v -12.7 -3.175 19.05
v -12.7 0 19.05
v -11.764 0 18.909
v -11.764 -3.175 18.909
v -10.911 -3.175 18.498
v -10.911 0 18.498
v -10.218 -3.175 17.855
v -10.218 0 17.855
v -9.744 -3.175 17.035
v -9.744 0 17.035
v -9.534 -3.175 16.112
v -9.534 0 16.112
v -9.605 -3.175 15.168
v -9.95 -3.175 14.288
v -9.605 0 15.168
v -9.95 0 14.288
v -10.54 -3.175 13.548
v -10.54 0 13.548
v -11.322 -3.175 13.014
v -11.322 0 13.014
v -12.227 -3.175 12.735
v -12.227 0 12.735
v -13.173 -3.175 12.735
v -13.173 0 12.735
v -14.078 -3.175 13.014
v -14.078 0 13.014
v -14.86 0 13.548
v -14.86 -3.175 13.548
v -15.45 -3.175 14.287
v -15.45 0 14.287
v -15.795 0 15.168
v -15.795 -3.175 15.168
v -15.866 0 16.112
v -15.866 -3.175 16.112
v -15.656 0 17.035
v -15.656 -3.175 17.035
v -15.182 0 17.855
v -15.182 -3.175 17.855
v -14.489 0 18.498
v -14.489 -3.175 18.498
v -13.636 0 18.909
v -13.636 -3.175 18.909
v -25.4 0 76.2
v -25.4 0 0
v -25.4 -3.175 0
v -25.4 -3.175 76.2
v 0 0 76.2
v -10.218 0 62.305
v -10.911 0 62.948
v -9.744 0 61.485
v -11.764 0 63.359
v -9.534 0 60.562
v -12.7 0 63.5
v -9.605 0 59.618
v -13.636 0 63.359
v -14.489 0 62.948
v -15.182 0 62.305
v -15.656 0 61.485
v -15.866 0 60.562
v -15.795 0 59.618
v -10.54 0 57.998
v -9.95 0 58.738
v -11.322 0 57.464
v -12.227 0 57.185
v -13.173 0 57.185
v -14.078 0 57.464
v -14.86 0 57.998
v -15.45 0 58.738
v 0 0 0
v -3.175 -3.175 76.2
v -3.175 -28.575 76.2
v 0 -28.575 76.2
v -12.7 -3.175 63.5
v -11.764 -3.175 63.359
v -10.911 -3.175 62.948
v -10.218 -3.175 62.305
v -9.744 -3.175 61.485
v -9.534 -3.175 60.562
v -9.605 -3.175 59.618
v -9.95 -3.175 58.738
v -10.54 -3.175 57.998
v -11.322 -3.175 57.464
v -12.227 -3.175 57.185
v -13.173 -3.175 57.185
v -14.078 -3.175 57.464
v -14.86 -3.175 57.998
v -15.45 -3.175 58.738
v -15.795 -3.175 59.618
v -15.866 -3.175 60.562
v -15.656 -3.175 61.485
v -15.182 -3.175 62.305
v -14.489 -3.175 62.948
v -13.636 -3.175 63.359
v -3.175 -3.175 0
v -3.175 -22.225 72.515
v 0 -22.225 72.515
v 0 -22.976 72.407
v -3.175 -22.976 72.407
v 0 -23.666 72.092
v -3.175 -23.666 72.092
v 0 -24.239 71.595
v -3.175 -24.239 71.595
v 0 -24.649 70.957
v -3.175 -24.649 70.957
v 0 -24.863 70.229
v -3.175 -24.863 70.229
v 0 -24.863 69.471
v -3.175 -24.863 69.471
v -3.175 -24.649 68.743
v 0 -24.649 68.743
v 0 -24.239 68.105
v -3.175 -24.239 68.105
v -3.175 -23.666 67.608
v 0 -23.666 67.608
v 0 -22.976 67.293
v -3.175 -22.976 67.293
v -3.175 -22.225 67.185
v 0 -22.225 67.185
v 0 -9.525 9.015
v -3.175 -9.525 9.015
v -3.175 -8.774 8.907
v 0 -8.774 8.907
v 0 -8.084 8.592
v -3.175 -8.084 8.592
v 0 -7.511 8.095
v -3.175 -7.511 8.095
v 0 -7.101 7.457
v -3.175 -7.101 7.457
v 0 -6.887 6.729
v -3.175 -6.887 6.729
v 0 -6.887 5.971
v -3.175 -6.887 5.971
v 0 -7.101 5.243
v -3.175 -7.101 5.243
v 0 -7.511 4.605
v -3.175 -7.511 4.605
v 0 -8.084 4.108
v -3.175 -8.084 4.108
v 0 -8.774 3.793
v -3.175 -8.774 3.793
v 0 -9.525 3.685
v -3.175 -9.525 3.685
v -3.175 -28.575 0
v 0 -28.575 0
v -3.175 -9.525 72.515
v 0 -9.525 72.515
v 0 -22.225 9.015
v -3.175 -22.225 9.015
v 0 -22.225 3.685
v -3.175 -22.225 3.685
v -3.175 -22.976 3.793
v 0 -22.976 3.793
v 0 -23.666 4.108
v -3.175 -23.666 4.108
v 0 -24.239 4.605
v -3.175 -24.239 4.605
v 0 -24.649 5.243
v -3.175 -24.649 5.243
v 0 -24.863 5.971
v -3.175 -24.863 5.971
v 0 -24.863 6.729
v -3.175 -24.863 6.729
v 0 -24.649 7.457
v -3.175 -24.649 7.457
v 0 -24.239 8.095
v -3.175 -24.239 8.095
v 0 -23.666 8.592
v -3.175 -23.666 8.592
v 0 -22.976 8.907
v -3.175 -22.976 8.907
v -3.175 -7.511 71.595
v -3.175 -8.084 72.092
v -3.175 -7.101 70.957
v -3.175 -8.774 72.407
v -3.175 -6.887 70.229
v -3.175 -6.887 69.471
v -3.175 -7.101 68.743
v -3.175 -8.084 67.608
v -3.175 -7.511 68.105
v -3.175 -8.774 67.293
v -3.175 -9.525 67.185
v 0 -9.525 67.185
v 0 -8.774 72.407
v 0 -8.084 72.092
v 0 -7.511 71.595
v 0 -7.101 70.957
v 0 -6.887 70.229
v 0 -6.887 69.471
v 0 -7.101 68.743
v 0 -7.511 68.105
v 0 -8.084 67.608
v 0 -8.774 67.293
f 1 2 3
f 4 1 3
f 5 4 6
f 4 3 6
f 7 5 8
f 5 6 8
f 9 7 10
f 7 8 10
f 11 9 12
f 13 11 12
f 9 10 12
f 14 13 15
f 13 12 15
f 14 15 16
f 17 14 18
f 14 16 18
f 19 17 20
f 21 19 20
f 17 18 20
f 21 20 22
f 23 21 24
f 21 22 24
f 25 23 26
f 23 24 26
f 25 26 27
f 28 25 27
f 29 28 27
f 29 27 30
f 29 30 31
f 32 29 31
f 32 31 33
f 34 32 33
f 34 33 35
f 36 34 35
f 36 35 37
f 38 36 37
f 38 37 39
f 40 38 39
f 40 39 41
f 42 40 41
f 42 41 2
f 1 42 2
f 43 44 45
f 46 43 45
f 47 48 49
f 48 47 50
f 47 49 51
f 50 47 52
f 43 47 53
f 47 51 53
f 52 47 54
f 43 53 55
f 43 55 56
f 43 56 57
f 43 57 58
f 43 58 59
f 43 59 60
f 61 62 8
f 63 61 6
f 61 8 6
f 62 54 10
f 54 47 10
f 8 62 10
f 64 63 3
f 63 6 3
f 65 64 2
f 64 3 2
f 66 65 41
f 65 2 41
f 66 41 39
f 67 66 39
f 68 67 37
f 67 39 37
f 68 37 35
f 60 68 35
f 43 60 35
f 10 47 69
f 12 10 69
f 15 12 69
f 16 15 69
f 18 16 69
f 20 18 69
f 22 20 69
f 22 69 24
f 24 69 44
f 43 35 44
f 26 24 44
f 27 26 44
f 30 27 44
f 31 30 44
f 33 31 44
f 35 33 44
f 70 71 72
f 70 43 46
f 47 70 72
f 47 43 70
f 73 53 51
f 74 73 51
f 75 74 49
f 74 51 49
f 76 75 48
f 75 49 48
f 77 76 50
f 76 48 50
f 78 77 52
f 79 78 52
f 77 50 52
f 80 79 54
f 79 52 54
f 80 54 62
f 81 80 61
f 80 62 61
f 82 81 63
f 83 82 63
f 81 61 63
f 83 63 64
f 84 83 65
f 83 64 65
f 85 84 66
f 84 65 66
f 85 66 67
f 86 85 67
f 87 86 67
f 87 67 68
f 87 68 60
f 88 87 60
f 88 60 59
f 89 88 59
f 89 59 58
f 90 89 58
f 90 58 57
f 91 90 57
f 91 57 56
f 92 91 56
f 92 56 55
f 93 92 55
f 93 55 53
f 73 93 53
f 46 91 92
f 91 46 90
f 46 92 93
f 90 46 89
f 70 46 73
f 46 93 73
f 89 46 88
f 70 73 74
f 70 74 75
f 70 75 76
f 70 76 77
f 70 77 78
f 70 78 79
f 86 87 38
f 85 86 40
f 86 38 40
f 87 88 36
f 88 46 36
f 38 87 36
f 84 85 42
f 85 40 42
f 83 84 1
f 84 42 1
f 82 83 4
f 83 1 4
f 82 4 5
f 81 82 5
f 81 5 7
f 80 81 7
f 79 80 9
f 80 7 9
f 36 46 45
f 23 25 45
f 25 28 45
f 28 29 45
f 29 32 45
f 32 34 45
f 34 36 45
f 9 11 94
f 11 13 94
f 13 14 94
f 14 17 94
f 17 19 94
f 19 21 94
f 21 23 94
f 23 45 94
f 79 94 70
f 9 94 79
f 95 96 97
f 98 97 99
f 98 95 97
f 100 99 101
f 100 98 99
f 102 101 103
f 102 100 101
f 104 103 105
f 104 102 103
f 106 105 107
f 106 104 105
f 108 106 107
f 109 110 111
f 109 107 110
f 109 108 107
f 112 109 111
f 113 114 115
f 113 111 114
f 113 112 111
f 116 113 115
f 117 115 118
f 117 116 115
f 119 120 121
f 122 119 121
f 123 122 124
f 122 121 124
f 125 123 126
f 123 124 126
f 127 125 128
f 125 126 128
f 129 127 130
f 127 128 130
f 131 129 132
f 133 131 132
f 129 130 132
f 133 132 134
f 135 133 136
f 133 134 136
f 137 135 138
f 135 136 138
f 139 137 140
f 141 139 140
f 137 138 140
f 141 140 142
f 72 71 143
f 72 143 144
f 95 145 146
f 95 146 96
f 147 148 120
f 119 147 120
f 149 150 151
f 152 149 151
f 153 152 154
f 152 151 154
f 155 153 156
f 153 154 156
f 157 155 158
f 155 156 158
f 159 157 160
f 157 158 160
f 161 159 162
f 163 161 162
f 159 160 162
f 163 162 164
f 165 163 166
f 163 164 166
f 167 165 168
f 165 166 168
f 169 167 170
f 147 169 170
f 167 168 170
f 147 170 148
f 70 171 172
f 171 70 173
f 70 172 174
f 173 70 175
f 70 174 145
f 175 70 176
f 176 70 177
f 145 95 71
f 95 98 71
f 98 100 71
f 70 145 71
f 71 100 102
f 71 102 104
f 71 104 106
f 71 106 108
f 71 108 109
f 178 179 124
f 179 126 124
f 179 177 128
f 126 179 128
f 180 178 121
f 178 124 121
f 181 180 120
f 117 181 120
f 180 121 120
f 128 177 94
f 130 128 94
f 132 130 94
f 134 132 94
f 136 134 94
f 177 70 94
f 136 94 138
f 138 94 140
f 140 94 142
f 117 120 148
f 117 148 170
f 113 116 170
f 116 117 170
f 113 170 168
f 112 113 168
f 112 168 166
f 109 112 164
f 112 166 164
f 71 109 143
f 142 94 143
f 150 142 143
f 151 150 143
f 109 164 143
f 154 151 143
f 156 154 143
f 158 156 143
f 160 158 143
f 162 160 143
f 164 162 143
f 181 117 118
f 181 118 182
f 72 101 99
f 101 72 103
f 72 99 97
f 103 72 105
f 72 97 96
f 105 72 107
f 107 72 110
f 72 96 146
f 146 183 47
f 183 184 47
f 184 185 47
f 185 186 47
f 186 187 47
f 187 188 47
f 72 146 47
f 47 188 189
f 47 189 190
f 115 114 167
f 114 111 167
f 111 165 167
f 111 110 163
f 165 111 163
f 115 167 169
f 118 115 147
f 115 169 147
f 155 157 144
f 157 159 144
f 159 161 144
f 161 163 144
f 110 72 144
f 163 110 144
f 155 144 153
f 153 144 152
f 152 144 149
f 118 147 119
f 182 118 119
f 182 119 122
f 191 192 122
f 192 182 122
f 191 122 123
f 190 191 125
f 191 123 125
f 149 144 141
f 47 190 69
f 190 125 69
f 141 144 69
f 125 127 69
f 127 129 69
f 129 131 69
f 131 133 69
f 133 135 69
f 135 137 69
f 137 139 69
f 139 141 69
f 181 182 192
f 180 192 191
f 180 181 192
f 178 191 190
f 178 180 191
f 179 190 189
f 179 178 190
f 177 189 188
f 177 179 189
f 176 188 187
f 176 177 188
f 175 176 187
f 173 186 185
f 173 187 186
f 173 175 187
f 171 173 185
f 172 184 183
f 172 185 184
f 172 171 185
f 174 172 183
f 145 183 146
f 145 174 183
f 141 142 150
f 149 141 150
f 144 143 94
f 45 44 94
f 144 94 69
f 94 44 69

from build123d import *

# Parameters (mm, degrees)
BOSS_EXTRUDE1_DEPTH = 76.2
CUT_EXTRUDE1_REACH  = 97.038
SKETCH2_R           = 3.175
CUT_EXTRUDE2_REACH  = 97.038
SKETCH3_W           = 3.175
SKETCH3_H           = 22.225
CUT_EXTRUDE3_REACH  = 86.362


with BuildPart() as part:
    # Sketch1 → Boss-Extrude1 (new body)
    with BuildSketch(Plane.XY):
        Polygon((0, -50.8), (0, 0), (-25.4, 0), (-25.4, -3.175), (-3.175, -3.175), (-3.175, -50.8), align=None)
    extrude(amount=BOSS_EXTRUDE1_DEPTH)

    # Sketch2 → Cut-Extrude1 (cut, up to next)
    with BuildSketch(Plane(origin=(0, 0, 0), x_dir=(1, 0, 0), z_dir=(0, 1, 0)), mode=Mode.PRIVATE) as cut_extrude1_sk1:
        with Locations(Location((-12.7, -15.875, 0), (0, 0, 270))):
            Circle(SKETCH2_R)
    cut_extrude1_tool1 = extrude(cut_extrude1_sk1.sketch, amount=-CUT_EXTRUDE1_REACH, mode=Mode.PRIVATE) & part.part
    # Sketch2 → Cut-Extrude1 (cut, up to next)
    with BuildSketch(Plane(origin=(0, 0, 0), x_dir=(1, 0, 0), z_dir=(0, 1, 0)), mode=Mode.PRIVATE) as cut_extrude1_sk2:
        with Locations(Location((-12.7, -60.325, 0), (0, 0, 270))):
            Circle(SKETCH2_R)
    cut_extrude1_tool2 = extrude(cut_extrude1_sk2.sketch, amount=-CUT_EXTRUDE1_REACH, mode=Mode.PRIVATE) & part.part
    add(cut_extrude1_tool1.solids().sort_by_distance((-12.7, 0, 15.875))[0], mode=Mode.SUBTRACT)
    add(cut_extrude1_tool2.solids().sort_by_distance((-12.7, 0, 60.325))[0], mode=Mode.SUBTRACT)

    # Sketch3 → Cut-Extrude2 (cut, up to next)
    with BuildSketch(Plane.XY.offset(76.2), mode=Mode.PRIVATE) as cut_extrude2_sk1:
        with Locations((-1.5875, -39.6875)):
            Rectangle(SKETCH3_W, SKETCH3_H)
    cut_extrude2_tool1 = extrude(cut_extrude2_sk1.sketch, amount=-CUT_EXTRUDE2_REACH, mode=Mode.PRIVATE) & part.part
    add(cut_extrude2_tool1.solids().sort_by_distance((-1.5875, -39.6875, 76.2))[0], mode=Mode.SUBTRACT)

    # Sketch4 → Cut-Extrude3 (cut, up to next)
    with BuildSketch(Plane.ZY.offset(3.175), mode=Mode.PRIVATE) as cut_extrude3_sk1:
        with BuildLine():
            Line((72.515, -9.525), (72.515, -22.225))
            ThreePointArc((72.515, -22.225), (69.85, -24.89), (67.185, -22.225))
            Line((67.185, -22.225), (67.185, -9.525))
            ThreePointArc((67.185, -9.525), (69.85, -6.86), (72.515, -9.525))
        make_face()
    cut_extrude3_tool1 = extrude(cut_extrude3_sk1.sketch, amount=-CUT_EXTRUDE3_REACH, mode=Mode.PRIVATE) & part.part
    # Sketch4 → Cut-Extrude3 (cut, up to next)
    with BuildSketch(Plane.ZY.offset(3.175), mode=Mode.PRIVATE) as cut_extrude3_sk2:
        with BuildLine():
            Line((3.685, -9.525), (3.685, -22.225))
            ThreePointArc((3.685, -22.225), (6.35, -24.89), (9.015, -22.225))
            Line((9.015, -22.225), (9.015, -9.525))
            ThreePointArc((9.015, -9.525), (6.35, -6.86), (3.685, -9.525))
        make_face()
    cut_extrude3_tool2 = extrude(cut_extrude3_sk2.sketch, amount=-CUT_EXTRUDE3_REACH, mode=Mode.PRIVATE) & part.part
    add(cut_extrude3_tool1.solids().sort_by_distance((-3.175, -15.875, 69.85))[0], mode=Mode.SUBTRACT)
    add(cut_extrude3_tool2.solids().sort_by_distance((-3.175, -15.875, 6.35))[0], mode=Mode.SUBTRACT)


solid = part.part
